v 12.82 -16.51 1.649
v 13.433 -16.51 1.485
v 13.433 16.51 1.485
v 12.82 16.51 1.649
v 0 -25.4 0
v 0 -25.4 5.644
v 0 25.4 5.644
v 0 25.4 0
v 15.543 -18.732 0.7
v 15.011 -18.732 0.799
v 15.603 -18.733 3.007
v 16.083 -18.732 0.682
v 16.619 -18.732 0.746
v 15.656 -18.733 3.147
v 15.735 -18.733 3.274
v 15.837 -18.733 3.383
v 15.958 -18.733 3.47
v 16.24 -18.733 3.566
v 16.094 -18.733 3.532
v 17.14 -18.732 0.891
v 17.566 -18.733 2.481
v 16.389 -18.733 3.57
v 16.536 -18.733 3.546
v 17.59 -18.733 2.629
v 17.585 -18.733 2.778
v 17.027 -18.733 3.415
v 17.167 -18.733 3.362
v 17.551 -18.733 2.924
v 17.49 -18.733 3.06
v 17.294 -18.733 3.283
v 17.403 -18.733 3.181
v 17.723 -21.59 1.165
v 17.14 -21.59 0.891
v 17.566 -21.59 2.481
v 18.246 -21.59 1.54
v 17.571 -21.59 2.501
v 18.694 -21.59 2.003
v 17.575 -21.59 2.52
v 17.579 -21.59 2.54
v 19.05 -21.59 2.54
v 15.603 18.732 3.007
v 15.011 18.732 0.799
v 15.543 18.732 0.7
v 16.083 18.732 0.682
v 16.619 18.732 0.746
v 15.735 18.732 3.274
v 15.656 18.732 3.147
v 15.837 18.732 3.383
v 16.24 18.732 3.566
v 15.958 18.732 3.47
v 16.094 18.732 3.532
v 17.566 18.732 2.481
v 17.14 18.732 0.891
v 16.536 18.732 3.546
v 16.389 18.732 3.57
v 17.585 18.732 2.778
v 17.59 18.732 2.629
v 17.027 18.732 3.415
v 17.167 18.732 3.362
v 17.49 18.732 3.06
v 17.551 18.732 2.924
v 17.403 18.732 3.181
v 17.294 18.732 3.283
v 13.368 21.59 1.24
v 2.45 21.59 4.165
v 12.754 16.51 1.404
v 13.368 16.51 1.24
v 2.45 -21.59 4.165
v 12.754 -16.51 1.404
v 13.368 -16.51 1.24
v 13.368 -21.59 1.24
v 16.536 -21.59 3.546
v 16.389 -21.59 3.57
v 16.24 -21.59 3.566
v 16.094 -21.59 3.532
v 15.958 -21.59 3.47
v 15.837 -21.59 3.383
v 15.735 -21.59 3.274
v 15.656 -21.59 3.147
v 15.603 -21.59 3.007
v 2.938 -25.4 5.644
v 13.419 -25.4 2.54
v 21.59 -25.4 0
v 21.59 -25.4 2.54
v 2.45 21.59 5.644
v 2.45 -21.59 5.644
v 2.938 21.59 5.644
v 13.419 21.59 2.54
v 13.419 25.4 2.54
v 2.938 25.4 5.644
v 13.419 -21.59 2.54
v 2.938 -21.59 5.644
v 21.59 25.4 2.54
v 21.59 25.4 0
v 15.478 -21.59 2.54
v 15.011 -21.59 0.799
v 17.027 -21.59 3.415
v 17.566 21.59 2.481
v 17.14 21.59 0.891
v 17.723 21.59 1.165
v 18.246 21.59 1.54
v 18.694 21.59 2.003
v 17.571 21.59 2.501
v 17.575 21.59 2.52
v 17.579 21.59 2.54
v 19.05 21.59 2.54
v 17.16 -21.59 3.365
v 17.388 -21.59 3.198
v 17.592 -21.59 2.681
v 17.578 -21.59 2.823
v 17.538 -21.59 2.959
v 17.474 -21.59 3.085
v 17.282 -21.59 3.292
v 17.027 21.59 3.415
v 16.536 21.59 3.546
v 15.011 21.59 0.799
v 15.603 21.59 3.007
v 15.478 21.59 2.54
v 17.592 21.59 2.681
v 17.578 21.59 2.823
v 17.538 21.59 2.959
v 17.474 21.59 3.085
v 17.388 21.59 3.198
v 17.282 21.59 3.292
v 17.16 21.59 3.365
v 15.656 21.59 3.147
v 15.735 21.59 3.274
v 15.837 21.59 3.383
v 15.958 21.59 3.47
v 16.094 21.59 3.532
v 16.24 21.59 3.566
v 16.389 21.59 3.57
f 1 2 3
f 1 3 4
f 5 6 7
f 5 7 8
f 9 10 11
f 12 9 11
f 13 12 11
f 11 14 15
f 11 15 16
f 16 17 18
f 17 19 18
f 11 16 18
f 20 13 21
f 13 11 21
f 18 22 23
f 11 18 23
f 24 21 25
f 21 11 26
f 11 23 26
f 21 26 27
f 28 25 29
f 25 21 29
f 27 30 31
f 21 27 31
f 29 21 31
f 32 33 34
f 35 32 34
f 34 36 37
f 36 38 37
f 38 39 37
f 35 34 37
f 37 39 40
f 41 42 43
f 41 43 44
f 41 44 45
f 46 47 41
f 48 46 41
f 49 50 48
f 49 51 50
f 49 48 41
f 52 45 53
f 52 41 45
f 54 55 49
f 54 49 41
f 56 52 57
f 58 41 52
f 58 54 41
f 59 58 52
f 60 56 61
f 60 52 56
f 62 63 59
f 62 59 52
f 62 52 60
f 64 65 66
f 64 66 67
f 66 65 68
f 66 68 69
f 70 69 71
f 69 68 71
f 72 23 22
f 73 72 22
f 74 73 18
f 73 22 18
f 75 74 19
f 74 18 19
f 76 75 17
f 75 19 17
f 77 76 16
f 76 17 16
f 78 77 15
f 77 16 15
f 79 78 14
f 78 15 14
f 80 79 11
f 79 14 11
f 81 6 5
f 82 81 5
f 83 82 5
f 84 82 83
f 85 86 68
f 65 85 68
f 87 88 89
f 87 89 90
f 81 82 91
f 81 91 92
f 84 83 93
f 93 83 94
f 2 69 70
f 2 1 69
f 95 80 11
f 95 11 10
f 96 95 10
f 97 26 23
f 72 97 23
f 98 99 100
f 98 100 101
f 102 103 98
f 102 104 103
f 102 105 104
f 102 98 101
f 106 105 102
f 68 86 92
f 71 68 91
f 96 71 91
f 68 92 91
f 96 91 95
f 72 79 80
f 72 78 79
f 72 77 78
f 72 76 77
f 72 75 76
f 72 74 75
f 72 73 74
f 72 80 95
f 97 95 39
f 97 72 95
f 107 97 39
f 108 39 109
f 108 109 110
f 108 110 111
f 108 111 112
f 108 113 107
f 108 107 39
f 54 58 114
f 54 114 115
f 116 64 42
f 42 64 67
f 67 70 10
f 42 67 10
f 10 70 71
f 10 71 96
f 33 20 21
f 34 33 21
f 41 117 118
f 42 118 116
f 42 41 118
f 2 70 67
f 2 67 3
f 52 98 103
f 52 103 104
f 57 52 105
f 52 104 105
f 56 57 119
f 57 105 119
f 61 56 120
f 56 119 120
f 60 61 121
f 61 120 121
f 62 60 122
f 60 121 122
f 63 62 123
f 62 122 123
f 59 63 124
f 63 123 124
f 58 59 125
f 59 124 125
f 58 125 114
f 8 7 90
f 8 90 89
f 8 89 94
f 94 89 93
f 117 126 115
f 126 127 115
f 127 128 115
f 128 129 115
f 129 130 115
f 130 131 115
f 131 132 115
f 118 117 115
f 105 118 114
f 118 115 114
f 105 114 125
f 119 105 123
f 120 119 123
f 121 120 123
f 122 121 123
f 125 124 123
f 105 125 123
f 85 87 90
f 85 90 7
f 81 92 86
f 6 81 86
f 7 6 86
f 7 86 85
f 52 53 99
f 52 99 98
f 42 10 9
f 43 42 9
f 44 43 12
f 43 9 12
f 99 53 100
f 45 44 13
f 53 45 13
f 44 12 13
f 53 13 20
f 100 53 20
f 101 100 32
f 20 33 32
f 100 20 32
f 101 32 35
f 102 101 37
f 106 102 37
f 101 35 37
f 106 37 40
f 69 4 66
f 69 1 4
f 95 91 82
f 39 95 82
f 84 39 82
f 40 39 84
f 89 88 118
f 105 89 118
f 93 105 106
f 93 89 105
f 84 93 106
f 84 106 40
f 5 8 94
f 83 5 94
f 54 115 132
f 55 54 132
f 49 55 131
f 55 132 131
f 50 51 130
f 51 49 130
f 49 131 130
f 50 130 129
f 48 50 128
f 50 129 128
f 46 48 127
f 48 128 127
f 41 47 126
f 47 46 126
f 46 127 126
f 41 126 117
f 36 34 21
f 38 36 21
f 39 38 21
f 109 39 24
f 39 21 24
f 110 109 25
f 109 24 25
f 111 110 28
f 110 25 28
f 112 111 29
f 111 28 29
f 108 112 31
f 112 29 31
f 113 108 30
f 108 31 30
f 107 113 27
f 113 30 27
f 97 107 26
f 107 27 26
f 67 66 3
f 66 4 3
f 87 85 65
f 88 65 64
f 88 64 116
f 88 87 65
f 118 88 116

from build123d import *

# Parameters (mm, degrees)
F0_W        = 21.59
F0_H        = 50.8
F1_DEPTH    = 2.54
F3_DEPTH    = 21.59
F5_DEPTH    = 21.59
F6_T1_DEPTH = 46.99
F6_T3_DEPTH = 43.18
F7_W        = 5.334
F7_H        = 5.212301854
F8_DEPTH    = 18.7325
F10_DEPTH   = 50.8
F12_DEPTH   = 21.59
F14_DEPTH   = 16.51


# Not quite as in the source:
# - a fillet or chamfer that OpenCascade refuses, or shapes differently, is made with other operations: its cross-section is extruded or revolved along the edge and cut away or added


with BuildPart() as f1:
    # F0 (on Top) → F1 (new body)
    with BuildSketch(Plane.XY):
        with Locations((10.795, 0)):
            Rectangle(F0_W, F0_H)
    extrude(amount=F1_DEPTH)

    # F2 (on Front) → F3 (cut, symmetric)
    with BuildSketch(Plane.XZ):
        with BuildLine():
            Line((19.05, 2.54), (13.716, 2.54))
            Line((13.716, 2.54), (13.3675778015, 1.2396706526))
            Line((13.3675778015, 1.2396706526), (15.0113903727, 0.7992124017))
            ThreePointArc((15.0113903727, 0.7992124017), (17.3330984682, 0.9680336444), (19.05, 2.54))
        make_face()
    extrude(amount=F3_DEPTH, both=True, mode=Mode.SUBTRACT)

    # F4 (on Front) → F5 (join, symmetric)
    with BuildSketch(Plane.XZ):
        Polygon((15.8002708221, 3.7433543202), (15.0113903727, 0.7992124017), (16.9741516517, 0.273292102), (17.7630321012, 3.2174340206), align=None)
    extrude(amount=F5_DEPTH, both=True)

    # F6: fillet of radius 0.762 on 2 edges, made by hand

    # F6_s2 → F6_t1 (cut)
    with BuildSketch(Plane.XZ.offset(-23.495)):
        with BuildLine():
            ThreePointArc((16.5363063018, 3.5461342079), (15.9580861894, 3.4700100859), (15.6030507098, 3.0073188406))
            Line((15.6030507098, 3.0073188406), (15.8002708221, 3.7433543202))
            Line((15.8002708221, 3.7433543202), (16.5363063018, 3.5461342079))
        make_face()
    extrude(amount=F6_T1_DEPTH, mode=Mode.SUBTRACT)

    # F6_s4 → F6_t3 (cut)
    with BuildSketch(Plane.XZ.offset(-21.59)):
        with BuildLine():
            ThreePointArc((17.5658119888, 2.4813985409), (17.4896878668, 3.0596186533), (17.0269966215, 3.4146541329))
            Line((17.0269966215, 3.4146541329), (17.7630321012, 3.2174340206))
            Line((17.7630321012, 3.2174340206), (17.5658119888, 2.4813985409))
        make_face()
    extrude(amount=F6_T3_DEPTH, mode=Mode.SUBTRACT)

    # F7 (on Front) → F8 (cut, symmetric)
    with BuildSketch(Plane.XZ):
        with BuildLine():
            Line((19.05, 2.54), (13.716, 2.54))
            Line((13.716, 2.54), (13.3675778015, 1.2396706526))
            Line((13.3675778015, 1.2396706526), (15.0113903727, 0.7992124017))
            ThreePointArc((15.0113903727, 0.7992124017), (17.3330984682, 0.9680336444), (19.05, 2.54))
        make_face()
        with Locations((16.383, 5.146150927)):
            Rectangle(F7_W, F7_H)
    extrude(amount=F8_DEPTH, both=True, mode=Mode.SUBTRACT)

    # F9 (on face) → F10 (join)
    with BuildSketch(Plane.XZ.offset(25.4)):
        Polygon((0, 2.54), (13.4194806689, 2.54), (2.9378255369, 5.6436832687), (0, 5.6436832687), align=None)
    extrude(amount=-F10_DEPTH)

    # F11 (on Front) → F12 (cut, symmetric)
    with BuildSketch(Plane.XZ):
        Polygon((2.4497181869, 4.1651023194), (15.0113903727, 0.7992124017), (15.0113903727, 10.927637258), (2.4497181869, 10.927637258), align=None)
    extrude(amount=F12_DEPTH, both=True, mode=Mode.SUBTRACT)

    # F13 (on Front) → F14 (join, symmetric)
    with BuildSketch(Plane.XZ):
        Polygon((12.7542149018, 1.4040207463), (13.3675778015, 1.2396706526), (13.4333178389, 1.4850158125), (12.8199549392, 1.6493659062), align=None)
    extrude(amount=F14_DEPTH, both=True)


solid = f1.part
